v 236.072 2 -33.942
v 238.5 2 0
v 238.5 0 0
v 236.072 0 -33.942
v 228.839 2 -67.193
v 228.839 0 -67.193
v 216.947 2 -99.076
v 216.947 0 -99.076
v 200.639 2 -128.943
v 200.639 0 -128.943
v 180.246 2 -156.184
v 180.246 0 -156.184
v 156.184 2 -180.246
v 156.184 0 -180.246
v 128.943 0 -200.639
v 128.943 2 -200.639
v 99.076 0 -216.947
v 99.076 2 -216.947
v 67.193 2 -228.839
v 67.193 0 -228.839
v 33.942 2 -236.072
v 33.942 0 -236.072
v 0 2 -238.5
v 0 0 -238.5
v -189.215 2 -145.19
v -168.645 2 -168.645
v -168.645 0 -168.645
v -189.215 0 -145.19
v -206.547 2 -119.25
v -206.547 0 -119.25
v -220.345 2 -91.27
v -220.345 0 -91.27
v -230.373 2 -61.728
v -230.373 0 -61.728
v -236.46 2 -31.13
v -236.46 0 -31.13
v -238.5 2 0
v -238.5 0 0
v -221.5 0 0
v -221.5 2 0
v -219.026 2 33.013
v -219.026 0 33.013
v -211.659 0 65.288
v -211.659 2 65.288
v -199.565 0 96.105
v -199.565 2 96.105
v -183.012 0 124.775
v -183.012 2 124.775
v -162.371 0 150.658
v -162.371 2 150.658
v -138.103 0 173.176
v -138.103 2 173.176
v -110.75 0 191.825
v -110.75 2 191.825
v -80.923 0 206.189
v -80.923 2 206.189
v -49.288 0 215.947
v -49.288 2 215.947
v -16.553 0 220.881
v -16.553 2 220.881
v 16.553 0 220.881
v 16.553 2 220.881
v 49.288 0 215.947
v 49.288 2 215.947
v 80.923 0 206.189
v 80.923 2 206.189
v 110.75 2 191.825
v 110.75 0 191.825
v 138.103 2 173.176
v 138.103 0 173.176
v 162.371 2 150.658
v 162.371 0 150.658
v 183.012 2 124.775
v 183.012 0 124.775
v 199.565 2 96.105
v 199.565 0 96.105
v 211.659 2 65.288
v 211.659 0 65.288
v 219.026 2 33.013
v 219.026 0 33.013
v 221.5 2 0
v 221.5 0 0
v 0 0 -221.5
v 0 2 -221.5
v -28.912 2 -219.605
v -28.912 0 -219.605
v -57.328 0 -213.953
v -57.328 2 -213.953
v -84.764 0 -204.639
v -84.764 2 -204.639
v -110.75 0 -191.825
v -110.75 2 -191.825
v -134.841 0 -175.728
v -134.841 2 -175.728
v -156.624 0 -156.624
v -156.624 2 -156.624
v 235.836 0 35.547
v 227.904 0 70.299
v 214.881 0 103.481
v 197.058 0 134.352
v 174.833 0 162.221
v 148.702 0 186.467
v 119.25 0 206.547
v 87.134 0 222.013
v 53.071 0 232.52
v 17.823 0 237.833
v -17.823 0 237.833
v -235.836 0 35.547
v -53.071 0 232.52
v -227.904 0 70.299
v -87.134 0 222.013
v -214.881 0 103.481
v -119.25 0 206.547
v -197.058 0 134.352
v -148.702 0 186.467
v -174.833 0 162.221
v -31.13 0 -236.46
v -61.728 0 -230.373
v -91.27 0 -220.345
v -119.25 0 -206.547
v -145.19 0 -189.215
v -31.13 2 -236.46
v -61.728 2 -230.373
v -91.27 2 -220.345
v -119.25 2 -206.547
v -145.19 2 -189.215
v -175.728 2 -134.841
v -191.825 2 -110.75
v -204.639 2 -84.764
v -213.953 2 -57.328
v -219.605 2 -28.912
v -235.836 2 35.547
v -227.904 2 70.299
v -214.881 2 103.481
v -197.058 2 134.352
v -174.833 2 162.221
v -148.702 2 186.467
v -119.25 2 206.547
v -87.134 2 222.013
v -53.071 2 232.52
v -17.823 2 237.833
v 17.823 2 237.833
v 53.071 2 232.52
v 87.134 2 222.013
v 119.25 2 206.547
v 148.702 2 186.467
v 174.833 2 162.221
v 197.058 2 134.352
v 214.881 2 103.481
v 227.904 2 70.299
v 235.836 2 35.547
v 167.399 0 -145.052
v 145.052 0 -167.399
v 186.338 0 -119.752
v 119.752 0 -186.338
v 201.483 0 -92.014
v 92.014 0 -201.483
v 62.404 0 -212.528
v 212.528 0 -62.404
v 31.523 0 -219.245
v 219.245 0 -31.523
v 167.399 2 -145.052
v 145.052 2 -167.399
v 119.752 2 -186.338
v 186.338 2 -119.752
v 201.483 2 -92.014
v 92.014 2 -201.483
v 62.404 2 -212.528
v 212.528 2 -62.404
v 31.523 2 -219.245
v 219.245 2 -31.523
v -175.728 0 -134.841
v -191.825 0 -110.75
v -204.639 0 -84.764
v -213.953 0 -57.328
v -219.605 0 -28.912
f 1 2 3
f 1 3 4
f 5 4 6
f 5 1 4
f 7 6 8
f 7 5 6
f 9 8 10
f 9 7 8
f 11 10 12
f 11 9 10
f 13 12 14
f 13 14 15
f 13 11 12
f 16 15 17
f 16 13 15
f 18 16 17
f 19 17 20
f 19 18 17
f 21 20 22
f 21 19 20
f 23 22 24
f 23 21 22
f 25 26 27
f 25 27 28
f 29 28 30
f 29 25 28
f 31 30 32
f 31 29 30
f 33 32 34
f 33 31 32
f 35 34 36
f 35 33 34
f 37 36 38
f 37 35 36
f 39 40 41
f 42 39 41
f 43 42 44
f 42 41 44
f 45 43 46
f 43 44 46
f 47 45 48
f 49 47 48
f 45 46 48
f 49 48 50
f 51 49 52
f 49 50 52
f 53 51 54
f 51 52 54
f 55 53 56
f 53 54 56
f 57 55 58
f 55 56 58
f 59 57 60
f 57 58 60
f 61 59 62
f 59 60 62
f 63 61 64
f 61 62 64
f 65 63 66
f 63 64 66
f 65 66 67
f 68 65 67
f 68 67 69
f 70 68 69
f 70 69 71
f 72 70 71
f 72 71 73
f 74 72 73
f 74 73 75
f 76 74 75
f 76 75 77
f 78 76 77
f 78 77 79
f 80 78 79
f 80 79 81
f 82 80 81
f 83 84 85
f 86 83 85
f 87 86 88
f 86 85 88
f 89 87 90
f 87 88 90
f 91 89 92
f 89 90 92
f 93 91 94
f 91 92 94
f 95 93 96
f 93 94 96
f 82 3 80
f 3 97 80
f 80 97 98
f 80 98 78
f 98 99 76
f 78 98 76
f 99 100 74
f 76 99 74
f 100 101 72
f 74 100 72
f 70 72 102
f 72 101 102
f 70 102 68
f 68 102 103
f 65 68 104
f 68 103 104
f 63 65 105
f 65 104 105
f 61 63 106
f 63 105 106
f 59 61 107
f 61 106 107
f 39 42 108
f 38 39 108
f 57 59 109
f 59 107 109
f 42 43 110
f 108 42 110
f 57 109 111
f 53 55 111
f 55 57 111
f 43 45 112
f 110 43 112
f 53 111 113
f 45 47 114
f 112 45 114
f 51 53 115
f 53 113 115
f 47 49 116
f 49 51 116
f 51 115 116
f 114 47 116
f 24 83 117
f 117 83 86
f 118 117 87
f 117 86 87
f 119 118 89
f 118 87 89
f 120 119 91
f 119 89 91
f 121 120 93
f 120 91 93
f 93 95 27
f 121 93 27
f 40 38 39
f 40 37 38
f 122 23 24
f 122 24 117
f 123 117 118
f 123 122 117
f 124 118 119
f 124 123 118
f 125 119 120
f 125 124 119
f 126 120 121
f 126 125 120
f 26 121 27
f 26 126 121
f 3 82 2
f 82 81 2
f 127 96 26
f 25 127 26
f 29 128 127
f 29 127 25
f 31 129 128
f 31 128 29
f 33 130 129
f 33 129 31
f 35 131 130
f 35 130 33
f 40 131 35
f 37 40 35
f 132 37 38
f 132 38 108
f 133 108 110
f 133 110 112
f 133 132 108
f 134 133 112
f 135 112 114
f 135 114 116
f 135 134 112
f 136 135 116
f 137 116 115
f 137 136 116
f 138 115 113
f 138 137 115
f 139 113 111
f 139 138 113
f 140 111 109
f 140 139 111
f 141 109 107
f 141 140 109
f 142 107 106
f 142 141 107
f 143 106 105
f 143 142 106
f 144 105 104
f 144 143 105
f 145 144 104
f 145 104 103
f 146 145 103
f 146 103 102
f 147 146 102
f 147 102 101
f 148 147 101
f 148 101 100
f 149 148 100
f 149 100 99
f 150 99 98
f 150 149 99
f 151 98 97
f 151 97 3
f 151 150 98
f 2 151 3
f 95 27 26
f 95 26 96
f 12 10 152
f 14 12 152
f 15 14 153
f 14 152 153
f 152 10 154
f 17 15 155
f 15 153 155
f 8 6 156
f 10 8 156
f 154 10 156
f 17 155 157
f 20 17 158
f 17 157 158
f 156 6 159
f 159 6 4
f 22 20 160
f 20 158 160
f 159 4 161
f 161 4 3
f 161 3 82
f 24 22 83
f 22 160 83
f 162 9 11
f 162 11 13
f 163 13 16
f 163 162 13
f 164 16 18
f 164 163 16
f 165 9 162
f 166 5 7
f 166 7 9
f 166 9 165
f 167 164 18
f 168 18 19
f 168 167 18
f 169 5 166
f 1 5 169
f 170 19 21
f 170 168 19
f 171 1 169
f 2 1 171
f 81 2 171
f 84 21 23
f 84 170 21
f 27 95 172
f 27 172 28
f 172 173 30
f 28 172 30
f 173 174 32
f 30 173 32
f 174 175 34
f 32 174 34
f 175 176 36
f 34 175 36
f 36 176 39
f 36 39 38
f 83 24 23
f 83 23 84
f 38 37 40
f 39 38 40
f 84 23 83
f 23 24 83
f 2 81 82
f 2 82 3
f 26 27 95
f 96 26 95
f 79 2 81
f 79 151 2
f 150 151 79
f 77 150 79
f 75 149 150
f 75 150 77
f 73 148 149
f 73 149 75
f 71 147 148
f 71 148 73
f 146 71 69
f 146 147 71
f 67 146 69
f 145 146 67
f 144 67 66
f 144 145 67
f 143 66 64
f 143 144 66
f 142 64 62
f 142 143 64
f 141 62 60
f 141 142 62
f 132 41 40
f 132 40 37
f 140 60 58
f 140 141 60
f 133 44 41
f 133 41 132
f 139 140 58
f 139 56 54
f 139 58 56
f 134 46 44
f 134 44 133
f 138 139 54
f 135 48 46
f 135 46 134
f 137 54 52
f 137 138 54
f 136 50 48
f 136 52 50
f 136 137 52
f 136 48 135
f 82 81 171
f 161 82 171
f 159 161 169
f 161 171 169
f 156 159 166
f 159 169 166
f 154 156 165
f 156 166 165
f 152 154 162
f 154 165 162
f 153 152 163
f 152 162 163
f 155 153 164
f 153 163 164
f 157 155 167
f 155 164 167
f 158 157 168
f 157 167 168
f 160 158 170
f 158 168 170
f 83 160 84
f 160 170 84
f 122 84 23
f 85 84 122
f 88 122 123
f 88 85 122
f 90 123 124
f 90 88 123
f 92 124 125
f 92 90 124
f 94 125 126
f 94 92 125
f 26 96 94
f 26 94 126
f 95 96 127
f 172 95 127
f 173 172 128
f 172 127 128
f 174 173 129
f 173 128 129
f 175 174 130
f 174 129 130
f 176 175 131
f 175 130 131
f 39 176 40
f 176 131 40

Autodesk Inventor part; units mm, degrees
ref_plane "XZ Plane" through (0, 0, 0) normal (0, 1, 0) x (-1, 0, 0)
sketch "Sketch1" plane through (0, 0, 0) normal (0, 1, 0) x (-1, 0, 0)
  circle A0 centre (0, 0) radius 230
  circle A1 centre (0, 0) radius 215
  circle A2 centre (0, 0) radius 245
  dimension "d0" = 460
  dimension "d1" = 15
  dimension "d2" = 15
extrude "Extrusion1" add sketch "Sketch1" along normal blind 2 contours A0 | A2
ref_plane "Work Plane2" through (0, 0, 0) normal (0.7071068, 0, -0.7071068) x (0, 1, 0)
sketch "Sketch3" plane through (0, 2, 0) normal (0, 1, 0) x (1, 0, 0)
  circle A0 centre (0, 0) radius 245 projected
  circle A1 centre (0, 0) radius 215 projected
  circle A2 centre (0, 0) radius 226.5
  circle A3 centre (0, 0) radius 233.5
  circle A4 centre (0, 0) radius 230
  circle A5 centre (0, 0) radius 221.5
  circle A6 centre (0, 0) radius 238.5
  dimension "d10" = 7
  dimension "d11" = 3.5
  dimension "d12" = 15
  dimension "d13" = 15
  dimension "d14" = 5
  dimension "d15" = 5
extrude "Extrusion4" cut sketch "Sketch3" against normal up to surface (2 mm away) contours A0 | A5
split_face "Split10"
split body "Split11" result two bodies by plane through (0, 0, 0) normal (0, 0, 1) first body at (232.5133, 0.5, 7.1263)
split body "Split12" result two bodies by plane through (0, 0, 0) normal (1, 0, 0) bodies 3 first body at (6.9289, 0.5, -232.5308)
split body "Split13" result two bodies by plane through (0, 0, 0) normal (0.7071068, 0, -0.7071068) bodies 5 first body at (-159.5247, 0.5, -169.3236)
properties part number "Bottom Guiding Rail LC" material "PLA Plastic"
